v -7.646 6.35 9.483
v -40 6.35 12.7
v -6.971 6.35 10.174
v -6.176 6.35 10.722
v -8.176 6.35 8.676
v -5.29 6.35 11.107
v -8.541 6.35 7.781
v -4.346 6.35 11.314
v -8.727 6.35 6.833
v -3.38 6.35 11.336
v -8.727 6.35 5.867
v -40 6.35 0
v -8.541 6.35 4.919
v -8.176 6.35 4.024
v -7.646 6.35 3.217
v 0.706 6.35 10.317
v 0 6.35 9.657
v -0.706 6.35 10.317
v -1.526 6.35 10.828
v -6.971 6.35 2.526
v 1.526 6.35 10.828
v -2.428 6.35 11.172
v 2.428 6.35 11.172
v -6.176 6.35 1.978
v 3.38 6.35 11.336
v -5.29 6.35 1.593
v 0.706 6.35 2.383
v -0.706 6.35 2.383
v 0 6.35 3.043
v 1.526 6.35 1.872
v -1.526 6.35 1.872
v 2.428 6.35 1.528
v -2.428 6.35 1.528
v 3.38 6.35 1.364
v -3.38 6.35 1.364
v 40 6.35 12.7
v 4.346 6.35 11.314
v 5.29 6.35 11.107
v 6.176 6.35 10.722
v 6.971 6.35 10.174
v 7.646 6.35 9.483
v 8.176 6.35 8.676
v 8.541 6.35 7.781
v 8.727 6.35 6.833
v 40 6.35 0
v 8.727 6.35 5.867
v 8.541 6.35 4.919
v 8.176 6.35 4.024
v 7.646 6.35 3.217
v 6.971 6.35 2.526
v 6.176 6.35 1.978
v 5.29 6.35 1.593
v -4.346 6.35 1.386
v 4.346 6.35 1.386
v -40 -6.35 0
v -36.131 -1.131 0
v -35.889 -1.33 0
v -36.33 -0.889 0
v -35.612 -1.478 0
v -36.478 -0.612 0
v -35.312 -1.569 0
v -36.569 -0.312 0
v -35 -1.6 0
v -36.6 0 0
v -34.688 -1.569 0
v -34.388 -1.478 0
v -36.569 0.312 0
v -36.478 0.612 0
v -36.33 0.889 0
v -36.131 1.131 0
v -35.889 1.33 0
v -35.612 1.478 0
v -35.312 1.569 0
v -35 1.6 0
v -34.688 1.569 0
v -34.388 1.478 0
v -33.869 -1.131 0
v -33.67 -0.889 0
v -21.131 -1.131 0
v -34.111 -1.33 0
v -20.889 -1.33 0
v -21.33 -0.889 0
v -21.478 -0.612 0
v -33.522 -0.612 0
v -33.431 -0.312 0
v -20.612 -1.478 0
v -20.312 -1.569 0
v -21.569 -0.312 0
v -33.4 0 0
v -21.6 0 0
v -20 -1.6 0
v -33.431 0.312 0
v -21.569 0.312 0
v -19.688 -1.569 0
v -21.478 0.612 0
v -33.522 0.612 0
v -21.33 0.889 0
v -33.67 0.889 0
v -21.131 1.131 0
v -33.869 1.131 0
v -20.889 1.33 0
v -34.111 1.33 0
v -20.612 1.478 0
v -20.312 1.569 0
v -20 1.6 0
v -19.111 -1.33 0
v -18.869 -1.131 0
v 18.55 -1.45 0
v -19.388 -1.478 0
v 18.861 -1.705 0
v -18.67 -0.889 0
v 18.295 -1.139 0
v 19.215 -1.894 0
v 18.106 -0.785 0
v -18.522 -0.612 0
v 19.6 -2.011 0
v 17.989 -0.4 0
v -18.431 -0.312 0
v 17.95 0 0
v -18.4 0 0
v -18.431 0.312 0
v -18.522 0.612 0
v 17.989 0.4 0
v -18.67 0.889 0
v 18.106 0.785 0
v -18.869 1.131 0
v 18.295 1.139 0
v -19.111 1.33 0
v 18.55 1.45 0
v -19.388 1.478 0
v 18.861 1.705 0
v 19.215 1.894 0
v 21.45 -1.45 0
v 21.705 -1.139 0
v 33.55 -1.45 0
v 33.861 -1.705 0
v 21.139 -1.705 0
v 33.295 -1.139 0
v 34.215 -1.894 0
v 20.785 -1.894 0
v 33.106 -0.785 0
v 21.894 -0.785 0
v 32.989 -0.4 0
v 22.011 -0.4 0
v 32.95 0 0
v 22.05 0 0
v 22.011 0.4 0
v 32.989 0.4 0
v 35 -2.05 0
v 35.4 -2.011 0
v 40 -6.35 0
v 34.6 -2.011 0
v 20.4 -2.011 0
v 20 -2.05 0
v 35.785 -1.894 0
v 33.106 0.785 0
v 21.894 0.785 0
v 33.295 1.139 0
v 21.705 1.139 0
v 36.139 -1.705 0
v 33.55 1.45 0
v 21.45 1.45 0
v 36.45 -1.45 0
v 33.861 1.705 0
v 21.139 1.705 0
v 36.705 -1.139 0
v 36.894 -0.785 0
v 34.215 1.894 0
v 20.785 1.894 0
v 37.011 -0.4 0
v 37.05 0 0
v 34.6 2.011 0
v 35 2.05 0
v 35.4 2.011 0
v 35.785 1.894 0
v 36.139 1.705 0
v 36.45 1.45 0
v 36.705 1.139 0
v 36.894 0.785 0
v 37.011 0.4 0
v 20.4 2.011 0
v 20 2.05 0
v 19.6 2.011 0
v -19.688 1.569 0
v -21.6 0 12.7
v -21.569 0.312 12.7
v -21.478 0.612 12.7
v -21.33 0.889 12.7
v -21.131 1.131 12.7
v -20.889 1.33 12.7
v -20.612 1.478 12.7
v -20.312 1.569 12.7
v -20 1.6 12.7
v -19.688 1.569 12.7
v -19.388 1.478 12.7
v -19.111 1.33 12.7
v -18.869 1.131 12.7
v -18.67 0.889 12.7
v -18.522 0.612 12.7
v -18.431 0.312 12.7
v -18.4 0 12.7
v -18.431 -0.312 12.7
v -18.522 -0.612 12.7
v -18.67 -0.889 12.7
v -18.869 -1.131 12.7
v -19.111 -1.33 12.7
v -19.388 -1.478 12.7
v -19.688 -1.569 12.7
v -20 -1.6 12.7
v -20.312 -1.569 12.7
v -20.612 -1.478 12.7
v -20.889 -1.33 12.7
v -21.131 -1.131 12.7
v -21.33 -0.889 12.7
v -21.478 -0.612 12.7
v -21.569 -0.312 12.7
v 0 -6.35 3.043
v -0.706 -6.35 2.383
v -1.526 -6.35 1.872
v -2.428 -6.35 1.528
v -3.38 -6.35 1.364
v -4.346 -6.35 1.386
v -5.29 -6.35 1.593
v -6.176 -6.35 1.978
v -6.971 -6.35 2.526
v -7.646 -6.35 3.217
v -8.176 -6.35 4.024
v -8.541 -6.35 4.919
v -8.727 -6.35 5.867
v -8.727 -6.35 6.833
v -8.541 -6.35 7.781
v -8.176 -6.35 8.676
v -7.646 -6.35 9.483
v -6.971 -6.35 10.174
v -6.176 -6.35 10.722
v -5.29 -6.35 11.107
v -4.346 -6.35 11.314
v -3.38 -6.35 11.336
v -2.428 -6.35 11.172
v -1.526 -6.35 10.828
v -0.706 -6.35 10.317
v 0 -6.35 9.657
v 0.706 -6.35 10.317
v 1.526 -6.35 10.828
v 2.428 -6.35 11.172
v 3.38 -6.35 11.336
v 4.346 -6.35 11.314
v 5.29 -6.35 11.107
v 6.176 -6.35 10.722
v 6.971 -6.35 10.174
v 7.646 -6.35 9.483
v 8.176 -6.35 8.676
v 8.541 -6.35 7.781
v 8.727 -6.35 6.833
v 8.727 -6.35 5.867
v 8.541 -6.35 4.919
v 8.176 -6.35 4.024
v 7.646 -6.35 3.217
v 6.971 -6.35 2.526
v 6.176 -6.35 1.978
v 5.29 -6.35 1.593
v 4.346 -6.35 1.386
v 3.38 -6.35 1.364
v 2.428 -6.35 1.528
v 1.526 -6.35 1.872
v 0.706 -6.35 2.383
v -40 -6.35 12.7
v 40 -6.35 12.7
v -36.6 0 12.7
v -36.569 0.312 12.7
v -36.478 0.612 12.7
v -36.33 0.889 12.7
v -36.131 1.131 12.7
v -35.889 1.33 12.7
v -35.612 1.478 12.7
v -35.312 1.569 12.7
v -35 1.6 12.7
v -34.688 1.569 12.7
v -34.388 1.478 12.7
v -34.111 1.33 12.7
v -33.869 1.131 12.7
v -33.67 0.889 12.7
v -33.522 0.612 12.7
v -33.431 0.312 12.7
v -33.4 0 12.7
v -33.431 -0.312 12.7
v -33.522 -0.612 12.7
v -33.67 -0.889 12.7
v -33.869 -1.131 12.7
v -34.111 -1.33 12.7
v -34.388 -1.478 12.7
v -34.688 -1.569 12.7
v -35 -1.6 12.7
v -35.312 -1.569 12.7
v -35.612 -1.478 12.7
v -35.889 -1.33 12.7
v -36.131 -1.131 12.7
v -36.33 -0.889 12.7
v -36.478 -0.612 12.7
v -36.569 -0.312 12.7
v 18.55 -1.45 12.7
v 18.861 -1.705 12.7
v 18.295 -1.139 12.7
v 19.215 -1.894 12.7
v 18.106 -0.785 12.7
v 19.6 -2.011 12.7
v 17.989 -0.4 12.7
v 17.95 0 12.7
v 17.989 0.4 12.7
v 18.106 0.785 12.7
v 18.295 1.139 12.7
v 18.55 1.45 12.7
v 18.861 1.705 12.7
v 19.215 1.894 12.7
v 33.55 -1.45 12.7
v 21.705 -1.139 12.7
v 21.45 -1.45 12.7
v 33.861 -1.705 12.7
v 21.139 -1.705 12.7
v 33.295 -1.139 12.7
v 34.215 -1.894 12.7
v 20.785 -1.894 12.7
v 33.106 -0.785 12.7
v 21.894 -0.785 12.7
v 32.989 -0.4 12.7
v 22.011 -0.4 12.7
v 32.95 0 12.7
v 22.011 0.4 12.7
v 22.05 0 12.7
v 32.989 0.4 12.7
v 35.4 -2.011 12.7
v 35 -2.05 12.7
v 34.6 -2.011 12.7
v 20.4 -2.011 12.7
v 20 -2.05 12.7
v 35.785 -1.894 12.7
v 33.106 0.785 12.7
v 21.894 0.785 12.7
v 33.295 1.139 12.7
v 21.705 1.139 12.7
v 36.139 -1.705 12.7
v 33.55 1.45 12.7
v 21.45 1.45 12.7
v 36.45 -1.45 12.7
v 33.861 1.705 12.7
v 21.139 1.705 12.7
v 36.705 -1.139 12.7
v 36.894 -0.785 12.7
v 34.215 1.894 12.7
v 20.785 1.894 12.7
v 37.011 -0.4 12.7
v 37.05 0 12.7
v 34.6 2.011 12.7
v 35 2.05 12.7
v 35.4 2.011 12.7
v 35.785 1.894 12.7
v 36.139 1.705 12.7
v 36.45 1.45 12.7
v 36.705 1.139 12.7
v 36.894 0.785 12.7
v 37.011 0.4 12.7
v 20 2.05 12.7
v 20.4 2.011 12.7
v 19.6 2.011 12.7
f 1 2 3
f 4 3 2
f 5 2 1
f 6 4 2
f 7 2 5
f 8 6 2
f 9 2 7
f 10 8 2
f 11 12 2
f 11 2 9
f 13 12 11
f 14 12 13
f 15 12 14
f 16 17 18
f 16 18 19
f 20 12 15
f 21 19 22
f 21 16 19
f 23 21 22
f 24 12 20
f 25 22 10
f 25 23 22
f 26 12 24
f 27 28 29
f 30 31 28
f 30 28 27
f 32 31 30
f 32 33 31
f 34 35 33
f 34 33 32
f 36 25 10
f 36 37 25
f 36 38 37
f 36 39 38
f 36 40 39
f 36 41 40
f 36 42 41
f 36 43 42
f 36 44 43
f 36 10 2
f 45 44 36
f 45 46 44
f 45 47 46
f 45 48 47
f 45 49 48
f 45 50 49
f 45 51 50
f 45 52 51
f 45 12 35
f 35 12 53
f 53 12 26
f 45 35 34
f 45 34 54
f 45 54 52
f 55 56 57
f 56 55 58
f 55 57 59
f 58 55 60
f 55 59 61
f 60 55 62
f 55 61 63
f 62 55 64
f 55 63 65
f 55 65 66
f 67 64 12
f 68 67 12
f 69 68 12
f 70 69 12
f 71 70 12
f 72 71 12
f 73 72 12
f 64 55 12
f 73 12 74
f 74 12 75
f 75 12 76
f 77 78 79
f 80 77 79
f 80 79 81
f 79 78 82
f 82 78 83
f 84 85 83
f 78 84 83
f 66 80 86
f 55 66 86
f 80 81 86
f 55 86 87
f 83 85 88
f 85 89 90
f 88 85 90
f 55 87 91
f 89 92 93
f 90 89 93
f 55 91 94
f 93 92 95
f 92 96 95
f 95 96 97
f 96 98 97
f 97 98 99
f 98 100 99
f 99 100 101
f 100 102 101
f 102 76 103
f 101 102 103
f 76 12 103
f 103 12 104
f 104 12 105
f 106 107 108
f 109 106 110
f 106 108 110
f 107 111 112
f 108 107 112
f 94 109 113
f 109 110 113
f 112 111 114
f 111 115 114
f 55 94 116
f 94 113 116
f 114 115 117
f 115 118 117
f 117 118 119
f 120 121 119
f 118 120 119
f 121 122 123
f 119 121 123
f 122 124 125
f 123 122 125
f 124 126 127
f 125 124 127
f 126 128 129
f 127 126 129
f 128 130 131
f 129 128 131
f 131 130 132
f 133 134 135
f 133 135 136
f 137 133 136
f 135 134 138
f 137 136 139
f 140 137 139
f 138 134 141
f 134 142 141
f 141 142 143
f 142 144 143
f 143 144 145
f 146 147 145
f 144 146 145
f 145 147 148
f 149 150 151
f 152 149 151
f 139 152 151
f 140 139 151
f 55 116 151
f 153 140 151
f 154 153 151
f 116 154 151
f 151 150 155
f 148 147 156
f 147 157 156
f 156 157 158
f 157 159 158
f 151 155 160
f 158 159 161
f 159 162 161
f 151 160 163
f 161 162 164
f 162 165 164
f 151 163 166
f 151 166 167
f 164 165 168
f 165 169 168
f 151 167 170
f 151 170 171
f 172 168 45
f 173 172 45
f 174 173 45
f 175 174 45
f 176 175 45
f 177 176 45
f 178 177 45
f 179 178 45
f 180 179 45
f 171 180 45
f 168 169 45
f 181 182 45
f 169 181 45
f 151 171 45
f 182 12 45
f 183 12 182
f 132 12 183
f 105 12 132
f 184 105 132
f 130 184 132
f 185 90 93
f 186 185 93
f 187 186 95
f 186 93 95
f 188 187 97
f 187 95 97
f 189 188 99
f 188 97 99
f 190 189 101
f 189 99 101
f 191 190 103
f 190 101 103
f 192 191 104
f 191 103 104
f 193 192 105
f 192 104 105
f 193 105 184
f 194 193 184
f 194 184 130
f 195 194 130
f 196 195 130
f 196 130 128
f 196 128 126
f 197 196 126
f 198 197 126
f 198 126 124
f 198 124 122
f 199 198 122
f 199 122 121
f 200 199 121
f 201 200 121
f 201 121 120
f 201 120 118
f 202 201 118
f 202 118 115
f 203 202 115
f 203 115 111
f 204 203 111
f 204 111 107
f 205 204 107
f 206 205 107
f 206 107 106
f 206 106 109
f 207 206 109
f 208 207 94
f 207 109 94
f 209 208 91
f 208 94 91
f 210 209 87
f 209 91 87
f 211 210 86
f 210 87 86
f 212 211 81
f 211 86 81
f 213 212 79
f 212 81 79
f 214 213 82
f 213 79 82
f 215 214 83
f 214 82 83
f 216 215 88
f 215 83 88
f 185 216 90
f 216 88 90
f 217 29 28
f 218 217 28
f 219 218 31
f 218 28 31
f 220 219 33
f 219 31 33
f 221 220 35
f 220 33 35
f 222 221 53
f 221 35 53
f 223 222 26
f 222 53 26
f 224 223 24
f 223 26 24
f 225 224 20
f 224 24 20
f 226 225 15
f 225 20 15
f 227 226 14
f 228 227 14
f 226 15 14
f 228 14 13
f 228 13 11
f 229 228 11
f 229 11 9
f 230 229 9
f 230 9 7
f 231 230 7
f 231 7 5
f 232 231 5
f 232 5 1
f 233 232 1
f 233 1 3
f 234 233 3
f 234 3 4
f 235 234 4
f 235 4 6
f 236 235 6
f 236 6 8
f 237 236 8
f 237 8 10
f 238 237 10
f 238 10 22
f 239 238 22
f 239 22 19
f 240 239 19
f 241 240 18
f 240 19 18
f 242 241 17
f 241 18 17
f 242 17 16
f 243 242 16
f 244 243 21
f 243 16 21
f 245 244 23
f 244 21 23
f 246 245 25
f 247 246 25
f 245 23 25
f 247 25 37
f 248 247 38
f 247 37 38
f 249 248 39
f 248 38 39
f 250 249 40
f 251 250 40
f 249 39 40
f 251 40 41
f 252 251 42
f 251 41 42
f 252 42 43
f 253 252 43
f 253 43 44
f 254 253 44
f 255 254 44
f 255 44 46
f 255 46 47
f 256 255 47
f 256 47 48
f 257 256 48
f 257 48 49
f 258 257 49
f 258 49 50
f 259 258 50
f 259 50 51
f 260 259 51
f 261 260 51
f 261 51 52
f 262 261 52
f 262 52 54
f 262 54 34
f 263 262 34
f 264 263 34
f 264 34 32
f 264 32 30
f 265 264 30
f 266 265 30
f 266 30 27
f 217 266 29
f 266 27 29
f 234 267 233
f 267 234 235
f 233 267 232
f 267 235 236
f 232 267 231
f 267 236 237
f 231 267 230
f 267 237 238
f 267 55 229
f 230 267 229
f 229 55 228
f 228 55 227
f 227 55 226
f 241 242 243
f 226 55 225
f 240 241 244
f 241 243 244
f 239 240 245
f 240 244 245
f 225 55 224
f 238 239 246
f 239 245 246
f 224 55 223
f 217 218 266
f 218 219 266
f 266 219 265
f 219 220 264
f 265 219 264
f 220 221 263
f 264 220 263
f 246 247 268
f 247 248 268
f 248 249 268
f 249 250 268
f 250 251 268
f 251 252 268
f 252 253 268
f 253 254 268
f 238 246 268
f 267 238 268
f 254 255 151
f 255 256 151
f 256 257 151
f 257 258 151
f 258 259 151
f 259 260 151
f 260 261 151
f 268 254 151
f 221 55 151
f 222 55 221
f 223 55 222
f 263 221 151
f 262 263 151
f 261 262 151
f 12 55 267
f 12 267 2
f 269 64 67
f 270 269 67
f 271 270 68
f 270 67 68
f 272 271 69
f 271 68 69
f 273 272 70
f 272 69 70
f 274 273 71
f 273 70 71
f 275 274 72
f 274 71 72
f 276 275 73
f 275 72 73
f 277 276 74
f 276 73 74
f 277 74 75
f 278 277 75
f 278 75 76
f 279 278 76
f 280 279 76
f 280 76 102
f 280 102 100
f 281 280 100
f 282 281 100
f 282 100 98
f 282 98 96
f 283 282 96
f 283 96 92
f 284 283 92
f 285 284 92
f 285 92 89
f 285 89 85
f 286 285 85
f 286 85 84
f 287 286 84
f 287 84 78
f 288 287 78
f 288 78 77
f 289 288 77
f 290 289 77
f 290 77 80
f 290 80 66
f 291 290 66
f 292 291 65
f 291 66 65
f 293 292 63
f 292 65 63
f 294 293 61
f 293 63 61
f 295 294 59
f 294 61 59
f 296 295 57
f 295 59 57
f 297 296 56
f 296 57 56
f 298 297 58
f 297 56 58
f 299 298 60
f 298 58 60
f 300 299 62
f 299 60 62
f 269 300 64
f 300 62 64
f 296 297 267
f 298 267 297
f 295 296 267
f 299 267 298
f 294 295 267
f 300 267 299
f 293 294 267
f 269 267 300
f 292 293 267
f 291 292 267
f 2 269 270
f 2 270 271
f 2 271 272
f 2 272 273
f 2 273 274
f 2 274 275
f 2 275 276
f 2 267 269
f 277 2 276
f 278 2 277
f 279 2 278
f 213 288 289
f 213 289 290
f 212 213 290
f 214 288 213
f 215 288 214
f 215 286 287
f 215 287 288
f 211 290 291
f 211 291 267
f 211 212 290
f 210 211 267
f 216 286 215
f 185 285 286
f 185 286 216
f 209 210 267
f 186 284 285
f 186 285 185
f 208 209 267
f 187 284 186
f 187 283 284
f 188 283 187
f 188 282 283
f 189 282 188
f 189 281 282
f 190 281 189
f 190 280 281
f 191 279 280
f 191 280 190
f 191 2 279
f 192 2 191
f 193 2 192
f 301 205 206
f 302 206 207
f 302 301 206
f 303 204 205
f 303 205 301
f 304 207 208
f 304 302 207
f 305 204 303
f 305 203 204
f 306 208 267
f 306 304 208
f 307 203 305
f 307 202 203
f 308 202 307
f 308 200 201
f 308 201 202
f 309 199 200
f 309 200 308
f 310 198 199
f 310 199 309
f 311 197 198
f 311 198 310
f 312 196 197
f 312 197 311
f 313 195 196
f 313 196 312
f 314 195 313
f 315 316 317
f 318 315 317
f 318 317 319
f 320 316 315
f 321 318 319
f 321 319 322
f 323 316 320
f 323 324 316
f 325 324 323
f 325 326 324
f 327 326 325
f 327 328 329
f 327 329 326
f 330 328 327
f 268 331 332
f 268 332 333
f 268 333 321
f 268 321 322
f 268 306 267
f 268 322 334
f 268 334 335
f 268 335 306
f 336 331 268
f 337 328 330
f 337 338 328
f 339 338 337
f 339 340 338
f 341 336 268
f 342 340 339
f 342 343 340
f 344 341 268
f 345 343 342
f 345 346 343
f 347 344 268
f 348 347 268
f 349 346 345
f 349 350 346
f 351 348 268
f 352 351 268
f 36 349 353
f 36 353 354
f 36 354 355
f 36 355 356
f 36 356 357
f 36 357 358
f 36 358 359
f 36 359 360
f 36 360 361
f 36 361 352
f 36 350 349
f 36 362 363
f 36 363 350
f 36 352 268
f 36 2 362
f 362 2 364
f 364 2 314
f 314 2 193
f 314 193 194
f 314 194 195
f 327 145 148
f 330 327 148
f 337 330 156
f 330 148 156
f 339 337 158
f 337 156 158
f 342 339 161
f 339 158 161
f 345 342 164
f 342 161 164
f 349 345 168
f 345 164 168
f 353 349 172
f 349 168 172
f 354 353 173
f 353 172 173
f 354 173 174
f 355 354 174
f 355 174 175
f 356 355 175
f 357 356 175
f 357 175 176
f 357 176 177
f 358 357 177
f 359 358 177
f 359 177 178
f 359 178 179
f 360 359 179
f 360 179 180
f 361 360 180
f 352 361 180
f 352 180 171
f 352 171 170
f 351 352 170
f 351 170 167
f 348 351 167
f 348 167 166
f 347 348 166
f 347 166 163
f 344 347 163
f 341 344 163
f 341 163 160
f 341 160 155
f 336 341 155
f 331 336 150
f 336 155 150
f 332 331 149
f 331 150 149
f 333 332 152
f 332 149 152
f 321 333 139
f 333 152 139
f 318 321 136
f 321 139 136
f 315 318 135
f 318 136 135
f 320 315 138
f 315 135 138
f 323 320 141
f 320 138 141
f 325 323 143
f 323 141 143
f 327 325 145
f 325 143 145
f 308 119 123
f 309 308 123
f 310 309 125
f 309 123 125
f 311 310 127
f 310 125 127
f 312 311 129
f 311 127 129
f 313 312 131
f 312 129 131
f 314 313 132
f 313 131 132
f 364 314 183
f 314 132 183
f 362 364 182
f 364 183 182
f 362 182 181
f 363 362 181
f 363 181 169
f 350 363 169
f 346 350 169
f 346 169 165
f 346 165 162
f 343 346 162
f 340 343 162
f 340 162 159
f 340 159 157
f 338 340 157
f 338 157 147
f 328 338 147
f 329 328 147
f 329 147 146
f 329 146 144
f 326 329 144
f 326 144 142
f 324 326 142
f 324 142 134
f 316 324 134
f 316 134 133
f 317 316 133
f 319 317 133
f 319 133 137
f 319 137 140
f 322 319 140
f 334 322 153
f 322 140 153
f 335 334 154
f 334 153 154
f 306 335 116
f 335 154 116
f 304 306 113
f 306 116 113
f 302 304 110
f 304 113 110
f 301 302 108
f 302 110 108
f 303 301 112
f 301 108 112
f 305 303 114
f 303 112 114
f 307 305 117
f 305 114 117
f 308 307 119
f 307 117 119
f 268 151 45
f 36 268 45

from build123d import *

# Parameters (mm, degrees)
F0_W     = 80
F0_H     = 12.7
F1_DEPTH = 12.7
F3_D     = 3.2
F5_D     = 4.1
F7_D     = 10


with BuildPart() as f1:
    # F0 (on Top) → F1 (new body)
    with BuildSketch(Plane.XY):
        Rectangle(F0_W, F0_H)
    extrude(amount=F1_DEPTH)

    # F3 (through all)
    with Locations(Plane.XY.offset(12.7)):
        with Locations((-35, 0), (-20, 0)):
            Hole(F3_D / 2)

    # F5 (through all)
    with Locations(Plane.XY.offset(12.7)):
        with Locations((20, 0), (35, 0)):
            Hole(F5_D / 2)

    # F7 (through all)
    with Locations(Plane.XZ.offset(6.35)):
        with Locations((-3.75, 6.35), (3.75, 6.35)):
            Hole(F7_D / 2)


solid = f1.part
